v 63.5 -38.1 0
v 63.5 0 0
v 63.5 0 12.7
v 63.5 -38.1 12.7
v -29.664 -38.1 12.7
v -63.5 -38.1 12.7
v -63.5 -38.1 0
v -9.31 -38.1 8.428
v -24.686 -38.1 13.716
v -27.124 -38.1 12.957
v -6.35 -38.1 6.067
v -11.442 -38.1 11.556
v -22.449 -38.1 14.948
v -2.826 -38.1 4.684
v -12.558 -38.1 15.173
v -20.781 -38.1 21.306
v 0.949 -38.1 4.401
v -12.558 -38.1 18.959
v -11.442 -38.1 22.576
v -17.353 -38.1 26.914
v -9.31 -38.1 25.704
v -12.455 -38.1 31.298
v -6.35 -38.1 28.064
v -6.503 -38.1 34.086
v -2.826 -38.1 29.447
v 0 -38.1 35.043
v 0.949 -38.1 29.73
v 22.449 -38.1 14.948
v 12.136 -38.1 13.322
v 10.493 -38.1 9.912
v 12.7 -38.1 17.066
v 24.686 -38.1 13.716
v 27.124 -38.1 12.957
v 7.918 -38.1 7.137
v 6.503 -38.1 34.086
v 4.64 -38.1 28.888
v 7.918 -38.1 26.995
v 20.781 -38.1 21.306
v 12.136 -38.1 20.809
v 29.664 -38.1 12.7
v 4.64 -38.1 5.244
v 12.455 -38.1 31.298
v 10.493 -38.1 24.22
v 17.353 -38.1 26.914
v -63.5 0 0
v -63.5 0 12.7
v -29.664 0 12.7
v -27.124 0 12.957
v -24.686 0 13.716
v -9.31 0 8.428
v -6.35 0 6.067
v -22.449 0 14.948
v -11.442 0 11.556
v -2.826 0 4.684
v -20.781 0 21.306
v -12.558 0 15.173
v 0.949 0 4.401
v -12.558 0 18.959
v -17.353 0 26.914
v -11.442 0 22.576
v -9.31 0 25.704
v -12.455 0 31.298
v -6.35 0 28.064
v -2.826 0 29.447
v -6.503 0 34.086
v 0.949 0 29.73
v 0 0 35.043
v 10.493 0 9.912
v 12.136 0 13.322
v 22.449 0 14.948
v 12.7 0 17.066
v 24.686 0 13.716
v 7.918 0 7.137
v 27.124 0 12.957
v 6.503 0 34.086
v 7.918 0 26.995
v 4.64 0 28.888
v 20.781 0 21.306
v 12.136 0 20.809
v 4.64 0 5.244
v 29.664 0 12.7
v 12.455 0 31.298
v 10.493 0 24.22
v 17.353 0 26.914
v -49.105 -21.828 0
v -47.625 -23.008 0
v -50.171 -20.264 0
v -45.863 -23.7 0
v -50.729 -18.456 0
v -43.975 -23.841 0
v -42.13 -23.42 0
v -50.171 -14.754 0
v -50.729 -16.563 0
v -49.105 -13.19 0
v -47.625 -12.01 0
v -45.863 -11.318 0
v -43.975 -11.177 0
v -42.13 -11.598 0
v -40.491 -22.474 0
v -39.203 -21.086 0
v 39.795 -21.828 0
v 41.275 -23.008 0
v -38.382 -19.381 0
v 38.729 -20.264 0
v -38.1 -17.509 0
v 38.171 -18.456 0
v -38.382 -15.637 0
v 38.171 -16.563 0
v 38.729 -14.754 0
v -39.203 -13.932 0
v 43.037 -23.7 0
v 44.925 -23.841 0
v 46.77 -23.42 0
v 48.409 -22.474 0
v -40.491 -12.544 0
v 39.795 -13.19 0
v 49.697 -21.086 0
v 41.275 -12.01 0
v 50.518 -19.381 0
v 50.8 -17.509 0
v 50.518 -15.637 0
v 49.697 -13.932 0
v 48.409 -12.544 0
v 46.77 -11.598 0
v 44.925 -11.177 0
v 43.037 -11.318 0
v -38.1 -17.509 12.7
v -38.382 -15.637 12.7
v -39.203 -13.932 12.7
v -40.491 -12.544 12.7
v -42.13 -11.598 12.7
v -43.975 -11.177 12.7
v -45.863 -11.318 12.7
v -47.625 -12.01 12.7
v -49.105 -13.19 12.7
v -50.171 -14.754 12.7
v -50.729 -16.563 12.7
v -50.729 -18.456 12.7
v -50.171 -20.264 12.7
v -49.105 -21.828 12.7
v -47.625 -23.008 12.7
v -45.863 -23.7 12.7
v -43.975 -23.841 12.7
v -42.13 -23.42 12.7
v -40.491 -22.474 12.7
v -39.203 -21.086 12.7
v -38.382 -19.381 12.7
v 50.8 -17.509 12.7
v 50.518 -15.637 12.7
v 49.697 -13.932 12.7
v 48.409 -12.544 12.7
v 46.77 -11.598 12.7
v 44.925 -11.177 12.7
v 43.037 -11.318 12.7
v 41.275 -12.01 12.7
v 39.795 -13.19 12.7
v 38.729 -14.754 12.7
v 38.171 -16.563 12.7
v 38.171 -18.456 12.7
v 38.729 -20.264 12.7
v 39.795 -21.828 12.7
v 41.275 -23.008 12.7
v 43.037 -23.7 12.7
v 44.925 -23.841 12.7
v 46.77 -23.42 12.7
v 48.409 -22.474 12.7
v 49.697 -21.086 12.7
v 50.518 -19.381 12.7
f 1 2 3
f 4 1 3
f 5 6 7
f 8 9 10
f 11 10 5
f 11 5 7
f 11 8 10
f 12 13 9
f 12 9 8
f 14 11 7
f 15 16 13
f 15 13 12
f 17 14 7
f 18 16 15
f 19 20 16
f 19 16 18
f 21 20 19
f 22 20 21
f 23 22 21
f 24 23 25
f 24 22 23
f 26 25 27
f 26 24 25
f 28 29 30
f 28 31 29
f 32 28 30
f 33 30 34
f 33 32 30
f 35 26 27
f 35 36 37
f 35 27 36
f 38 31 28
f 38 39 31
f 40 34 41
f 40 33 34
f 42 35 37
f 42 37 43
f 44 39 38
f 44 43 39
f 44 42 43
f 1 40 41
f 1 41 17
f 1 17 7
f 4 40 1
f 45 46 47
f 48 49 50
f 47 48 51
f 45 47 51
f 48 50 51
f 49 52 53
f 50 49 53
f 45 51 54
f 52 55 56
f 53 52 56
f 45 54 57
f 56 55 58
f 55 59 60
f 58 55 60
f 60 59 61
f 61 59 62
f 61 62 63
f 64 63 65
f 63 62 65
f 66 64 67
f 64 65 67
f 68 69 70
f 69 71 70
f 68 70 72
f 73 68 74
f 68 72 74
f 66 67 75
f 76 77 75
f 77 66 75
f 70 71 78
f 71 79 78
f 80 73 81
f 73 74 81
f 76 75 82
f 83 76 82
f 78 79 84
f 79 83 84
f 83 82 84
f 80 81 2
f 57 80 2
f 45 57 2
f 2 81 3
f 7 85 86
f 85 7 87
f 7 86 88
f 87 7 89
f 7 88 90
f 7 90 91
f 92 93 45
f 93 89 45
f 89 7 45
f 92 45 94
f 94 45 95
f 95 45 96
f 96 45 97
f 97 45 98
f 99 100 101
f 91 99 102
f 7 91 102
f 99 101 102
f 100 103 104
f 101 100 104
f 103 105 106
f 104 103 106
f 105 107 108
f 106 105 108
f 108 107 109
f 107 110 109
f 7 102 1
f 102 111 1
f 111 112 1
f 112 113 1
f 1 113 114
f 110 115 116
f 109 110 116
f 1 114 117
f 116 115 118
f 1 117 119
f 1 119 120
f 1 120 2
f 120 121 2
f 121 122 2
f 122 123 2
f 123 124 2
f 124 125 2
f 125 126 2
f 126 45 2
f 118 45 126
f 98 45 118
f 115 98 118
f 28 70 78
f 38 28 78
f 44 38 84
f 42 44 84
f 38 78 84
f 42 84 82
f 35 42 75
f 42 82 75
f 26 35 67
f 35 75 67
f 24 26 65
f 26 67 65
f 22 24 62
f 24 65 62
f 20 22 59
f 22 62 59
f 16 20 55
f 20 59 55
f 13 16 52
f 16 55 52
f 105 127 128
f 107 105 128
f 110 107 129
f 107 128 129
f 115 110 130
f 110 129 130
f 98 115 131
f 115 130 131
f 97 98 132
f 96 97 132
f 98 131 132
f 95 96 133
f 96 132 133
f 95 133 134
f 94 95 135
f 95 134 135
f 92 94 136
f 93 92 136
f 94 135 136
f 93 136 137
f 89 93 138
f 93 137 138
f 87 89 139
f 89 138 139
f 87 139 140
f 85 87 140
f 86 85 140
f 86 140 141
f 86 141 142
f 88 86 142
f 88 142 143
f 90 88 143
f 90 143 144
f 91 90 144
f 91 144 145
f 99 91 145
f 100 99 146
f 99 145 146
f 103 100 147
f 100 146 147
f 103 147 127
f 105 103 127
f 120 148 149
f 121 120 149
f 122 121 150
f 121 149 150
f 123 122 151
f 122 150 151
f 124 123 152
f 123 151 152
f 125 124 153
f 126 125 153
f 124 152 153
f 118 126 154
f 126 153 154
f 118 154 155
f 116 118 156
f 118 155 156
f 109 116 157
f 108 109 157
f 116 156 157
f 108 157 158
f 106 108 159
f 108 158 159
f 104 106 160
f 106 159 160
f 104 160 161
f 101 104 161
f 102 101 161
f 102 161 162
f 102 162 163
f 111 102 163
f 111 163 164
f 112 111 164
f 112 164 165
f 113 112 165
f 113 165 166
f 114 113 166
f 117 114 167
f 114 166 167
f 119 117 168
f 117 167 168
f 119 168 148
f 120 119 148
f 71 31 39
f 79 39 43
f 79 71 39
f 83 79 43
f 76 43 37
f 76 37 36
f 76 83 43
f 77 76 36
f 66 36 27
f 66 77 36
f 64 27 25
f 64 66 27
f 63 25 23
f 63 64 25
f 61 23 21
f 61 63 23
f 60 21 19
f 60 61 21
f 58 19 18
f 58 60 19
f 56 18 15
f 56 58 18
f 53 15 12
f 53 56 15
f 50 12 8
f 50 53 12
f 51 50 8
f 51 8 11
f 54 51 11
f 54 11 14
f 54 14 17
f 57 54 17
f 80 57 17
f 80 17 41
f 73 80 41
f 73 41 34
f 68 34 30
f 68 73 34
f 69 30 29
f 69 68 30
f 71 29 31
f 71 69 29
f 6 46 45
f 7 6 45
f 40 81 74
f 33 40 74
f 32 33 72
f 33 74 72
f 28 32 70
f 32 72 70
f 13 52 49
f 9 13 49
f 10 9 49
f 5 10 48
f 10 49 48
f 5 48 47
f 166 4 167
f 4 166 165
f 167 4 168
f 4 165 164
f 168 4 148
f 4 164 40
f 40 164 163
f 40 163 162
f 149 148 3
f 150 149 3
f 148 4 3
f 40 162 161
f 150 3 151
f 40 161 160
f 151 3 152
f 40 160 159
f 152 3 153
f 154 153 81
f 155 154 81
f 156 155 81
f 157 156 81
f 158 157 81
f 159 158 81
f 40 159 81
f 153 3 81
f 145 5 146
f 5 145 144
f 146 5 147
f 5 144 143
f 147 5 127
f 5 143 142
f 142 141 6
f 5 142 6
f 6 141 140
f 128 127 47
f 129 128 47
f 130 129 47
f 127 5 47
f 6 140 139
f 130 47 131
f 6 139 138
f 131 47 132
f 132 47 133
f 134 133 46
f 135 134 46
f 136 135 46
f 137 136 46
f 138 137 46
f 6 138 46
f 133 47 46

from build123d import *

# Parameters (mm, degrees)
F0_R     = 12.7
F1_DEPTH = 38.1
F2_R     = 6.35
F3_DEPTH = 12.7


with BuildPart() as f1:
    # F0 (on Front) → F1 (new body)
    with BuildSketch(Plane.XZ):
        with BuildLine():
            Line((-63.5, 0), (0, 0))
            Line((0, 0), (63.5, 0))
            Line((63.5, 0), (63.5, 12.7))
            Line((63.5, 12.7), (29.664059, 12.7))
            ThreePointArc((29.664059, 12.7), (25.885674, 13.275075), (22.449471, 14.948219))
            ThreePointArc((22.449471, 14.948219), (0, 35.042593), (-22.449471, 14.948219))
            ThreePointArc((-22.449471, 14.948219), (-25.885674, 13.275075), (-29.664059, 12.7))
            Line((-29.664059, 12.7), (-63.5, 12.7))
            Line((-63.5, 12.7), (-63.5, 0))
        make_face()
        with Locations((0, 17.065845)):
            Circle(F0_R, mode=Mode.SUBTRACT)
    extrude(amount=F1_DEPTH)

    # F2 (on face) → F3 (cut, symmetric)
    with BuildSketch(Plane.XY.offset(12.7)):
        with Locations((-44.45, -17.509114)):
            Circle(F2_R)
        with Locations((44.45, -17.509114)):
            Circle(F2_R)
    extrude(amount=F3_DEPTH, both=True, mode=Mode.SUBTRACT)


solid = f1.part
